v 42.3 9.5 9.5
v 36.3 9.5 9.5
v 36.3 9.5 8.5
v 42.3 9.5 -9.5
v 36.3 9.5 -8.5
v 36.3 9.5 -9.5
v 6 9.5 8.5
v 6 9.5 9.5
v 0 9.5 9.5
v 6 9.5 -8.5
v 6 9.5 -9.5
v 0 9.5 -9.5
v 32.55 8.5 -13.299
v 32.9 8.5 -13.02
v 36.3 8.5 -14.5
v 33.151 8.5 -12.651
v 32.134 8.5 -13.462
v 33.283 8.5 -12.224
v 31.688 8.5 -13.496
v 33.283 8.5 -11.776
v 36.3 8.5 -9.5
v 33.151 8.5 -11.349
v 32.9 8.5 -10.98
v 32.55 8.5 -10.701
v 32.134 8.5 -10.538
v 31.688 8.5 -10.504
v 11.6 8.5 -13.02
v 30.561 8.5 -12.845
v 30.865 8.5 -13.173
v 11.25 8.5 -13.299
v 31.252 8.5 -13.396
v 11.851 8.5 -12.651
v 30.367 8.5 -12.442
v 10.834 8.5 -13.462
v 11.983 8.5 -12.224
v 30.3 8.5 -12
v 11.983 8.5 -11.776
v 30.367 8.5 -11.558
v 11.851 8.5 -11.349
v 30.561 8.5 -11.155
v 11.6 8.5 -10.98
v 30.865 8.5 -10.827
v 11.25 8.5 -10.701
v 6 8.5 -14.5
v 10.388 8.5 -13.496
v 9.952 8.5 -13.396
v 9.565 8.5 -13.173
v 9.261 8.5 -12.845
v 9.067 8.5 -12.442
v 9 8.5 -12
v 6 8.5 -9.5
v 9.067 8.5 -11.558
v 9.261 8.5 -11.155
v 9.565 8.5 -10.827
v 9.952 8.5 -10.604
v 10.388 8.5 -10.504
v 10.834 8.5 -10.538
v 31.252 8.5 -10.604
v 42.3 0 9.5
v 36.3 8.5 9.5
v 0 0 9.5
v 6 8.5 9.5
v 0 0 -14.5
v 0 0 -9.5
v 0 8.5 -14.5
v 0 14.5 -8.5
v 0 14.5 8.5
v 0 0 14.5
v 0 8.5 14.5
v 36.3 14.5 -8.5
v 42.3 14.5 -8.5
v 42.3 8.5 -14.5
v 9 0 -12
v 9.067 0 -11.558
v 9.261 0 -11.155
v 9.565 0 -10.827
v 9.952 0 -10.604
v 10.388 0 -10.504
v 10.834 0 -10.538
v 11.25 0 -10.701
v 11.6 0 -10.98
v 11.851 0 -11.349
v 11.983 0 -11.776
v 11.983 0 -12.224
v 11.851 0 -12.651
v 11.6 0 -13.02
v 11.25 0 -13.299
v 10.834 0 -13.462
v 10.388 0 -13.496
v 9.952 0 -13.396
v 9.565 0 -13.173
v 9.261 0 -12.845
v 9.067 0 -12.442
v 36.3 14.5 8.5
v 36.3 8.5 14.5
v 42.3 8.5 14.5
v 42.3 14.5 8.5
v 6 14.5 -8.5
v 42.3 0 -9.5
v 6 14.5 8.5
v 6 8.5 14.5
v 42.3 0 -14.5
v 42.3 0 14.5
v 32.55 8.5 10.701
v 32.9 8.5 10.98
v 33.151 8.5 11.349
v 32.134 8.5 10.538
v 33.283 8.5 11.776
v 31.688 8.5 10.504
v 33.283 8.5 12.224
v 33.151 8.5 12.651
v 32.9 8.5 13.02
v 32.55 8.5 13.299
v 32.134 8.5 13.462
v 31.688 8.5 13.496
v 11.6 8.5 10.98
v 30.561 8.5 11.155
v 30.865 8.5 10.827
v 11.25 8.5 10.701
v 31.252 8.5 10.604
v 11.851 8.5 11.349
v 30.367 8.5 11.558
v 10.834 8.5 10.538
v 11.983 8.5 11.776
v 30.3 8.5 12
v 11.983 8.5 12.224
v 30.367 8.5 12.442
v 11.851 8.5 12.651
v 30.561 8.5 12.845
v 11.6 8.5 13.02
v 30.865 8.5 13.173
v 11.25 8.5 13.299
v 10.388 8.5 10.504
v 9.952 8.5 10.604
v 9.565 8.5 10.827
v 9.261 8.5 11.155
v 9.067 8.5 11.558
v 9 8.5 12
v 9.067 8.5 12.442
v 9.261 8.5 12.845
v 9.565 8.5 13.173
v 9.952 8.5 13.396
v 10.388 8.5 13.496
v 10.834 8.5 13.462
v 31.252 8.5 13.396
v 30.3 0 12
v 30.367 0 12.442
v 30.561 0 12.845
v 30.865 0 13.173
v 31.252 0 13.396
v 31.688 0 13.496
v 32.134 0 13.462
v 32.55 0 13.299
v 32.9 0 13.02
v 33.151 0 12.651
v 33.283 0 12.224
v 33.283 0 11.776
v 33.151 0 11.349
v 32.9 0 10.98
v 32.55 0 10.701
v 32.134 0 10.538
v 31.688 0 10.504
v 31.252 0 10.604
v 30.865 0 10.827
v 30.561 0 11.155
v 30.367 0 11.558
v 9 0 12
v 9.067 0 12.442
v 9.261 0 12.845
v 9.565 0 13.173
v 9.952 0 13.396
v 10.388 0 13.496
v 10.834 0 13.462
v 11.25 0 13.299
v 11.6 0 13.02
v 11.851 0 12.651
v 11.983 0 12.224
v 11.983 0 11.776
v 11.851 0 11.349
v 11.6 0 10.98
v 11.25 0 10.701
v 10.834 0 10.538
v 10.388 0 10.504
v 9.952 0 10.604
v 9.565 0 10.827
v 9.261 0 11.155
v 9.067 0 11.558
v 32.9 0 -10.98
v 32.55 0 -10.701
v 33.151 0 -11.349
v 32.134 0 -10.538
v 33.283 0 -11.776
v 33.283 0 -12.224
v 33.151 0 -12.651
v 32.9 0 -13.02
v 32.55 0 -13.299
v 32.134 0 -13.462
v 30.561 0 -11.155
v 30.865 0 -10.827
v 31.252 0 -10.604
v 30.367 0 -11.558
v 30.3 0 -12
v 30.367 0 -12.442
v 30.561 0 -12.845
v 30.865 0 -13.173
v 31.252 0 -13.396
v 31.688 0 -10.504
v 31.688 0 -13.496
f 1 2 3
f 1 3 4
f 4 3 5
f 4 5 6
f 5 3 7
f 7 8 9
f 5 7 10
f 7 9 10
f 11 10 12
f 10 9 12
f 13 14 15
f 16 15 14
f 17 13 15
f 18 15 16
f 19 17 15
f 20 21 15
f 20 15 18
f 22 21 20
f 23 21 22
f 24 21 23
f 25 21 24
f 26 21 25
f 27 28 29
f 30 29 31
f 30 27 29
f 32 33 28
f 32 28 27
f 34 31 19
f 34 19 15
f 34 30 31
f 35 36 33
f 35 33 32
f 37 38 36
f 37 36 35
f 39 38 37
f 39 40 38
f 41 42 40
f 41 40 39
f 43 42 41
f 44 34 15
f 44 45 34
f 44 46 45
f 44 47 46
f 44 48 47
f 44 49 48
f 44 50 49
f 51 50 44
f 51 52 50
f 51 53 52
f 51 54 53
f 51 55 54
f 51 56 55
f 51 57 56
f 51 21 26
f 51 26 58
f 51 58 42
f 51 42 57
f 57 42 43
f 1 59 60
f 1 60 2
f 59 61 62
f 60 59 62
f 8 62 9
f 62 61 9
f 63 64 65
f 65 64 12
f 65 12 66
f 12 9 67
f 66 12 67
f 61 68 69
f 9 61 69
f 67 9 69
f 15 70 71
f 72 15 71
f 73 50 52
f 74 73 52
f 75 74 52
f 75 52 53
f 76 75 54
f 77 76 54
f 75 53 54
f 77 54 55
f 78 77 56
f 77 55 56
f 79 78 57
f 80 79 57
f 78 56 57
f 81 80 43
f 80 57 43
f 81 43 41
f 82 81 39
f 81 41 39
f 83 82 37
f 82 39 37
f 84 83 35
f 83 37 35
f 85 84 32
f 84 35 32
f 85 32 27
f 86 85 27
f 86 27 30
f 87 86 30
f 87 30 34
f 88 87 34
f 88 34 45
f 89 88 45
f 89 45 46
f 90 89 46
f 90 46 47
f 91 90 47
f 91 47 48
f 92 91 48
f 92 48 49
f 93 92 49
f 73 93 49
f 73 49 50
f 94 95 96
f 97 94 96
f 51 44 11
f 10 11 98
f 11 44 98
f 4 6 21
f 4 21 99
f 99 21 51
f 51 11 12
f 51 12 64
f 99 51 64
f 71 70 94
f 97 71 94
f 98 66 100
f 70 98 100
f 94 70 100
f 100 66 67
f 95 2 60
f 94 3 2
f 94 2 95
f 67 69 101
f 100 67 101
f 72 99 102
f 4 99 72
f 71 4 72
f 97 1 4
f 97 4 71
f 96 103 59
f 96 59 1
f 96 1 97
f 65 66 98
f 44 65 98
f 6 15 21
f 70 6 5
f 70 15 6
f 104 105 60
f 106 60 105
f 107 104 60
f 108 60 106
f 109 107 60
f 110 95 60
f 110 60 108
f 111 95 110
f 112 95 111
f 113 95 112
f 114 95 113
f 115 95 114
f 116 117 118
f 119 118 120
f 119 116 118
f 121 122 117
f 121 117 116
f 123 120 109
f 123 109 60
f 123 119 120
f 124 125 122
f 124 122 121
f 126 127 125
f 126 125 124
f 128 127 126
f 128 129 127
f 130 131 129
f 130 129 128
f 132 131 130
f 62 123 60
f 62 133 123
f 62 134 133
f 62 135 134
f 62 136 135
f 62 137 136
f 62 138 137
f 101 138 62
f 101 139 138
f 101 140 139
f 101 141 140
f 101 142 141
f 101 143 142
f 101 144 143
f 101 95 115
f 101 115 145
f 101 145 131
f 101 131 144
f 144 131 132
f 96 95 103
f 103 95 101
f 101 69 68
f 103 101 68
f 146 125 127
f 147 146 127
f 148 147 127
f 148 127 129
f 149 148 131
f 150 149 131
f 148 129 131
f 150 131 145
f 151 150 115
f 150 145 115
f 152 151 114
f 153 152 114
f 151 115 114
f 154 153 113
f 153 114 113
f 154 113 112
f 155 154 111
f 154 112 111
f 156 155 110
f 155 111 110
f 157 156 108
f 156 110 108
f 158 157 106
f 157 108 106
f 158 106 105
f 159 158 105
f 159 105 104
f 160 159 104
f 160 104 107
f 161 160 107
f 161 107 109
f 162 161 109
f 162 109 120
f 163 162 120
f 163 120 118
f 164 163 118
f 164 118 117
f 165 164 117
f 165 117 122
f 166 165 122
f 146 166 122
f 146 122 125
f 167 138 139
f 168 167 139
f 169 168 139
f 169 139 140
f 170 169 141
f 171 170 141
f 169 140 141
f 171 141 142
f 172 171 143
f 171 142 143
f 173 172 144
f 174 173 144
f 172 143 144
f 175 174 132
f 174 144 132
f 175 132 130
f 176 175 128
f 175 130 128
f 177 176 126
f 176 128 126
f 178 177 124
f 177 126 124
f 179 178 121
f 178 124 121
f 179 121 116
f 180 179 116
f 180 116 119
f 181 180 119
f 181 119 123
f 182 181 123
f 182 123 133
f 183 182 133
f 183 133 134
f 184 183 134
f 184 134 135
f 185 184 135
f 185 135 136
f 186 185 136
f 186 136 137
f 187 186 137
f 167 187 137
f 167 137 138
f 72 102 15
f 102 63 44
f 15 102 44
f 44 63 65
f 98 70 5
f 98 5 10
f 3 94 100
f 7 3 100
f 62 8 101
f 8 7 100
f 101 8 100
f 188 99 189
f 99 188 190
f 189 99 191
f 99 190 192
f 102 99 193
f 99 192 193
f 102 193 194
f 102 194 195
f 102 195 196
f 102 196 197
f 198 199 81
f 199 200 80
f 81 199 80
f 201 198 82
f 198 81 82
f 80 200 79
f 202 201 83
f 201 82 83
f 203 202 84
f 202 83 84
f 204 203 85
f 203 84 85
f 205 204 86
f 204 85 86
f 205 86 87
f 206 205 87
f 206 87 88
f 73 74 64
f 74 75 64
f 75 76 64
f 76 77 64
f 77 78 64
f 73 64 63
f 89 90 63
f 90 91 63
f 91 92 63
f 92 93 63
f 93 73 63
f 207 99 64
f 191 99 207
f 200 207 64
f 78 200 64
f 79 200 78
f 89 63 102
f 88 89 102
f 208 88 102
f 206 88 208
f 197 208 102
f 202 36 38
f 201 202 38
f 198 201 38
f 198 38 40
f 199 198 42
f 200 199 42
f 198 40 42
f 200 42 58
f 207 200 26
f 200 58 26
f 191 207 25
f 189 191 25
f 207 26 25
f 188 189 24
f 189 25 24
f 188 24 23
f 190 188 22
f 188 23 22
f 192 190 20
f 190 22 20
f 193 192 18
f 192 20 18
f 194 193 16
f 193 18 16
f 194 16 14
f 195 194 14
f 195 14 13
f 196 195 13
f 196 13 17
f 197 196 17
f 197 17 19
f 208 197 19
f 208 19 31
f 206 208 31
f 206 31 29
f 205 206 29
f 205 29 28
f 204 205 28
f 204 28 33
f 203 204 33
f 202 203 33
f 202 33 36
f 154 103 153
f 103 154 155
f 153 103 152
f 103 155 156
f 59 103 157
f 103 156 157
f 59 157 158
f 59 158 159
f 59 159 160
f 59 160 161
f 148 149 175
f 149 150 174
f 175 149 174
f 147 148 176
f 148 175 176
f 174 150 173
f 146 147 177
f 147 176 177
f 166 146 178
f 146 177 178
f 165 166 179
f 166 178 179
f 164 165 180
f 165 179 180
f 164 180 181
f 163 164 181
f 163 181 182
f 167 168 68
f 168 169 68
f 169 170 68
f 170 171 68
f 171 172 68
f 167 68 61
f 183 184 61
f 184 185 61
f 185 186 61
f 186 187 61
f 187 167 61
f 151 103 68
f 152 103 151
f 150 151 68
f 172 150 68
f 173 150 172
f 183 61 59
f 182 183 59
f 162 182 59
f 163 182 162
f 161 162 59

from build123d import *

# Parameters (mm, degrees)
F1_DEPTH = 42.3
F2_W     = 30.3
F2_H     = 6
F3_DEPTH = 6
F4_SIZE  = 6
F5_R     = 1.5
F6_DEPTH = 8.501
F7_R     = 1.5
F8_DEPTH = 8.501


# Not quite as in the source:
# - a feature names something its author has since deleted; it is built from what else it names


with BuildPart() as f1:
    # F0 (on Right) → F1 (new body)
    with BuildSketch(Plane.YZ):
        Polygon((0, 9.5), (9.5, 9.5), (9.5, -9.5), (0, -9.5), (0, -14.5), (14.5, -14.5), (14.5, 14.5), (0, 14.5), align=None)
    extrude(amount=F1_DEPTH)

    # F2 (on face) → F3 (cut)
    with BuildSketch(Plane(origin=(0, 14.5, 0), x_dir=(-1, 0, 0), z_dir=(0, 1, 0))):
        with Locations((-21.15, 11.5)):
            Rectangle(F2_W, F2_H)
        with Locations((-21.15, -11.5)):
            Rectangle(F2_W, F2_H)
    extrude(amount=-F3_DEPTH, mode=Mode.SUBTRACT)

    # F4
    f4_edges = [f1.edges().sort_by_distance(p)[0] for p in [
        (3, 14.5, -14.5),
        (39.3, 14.5, -14.5),
        (39.3, 14.5, 14.5),
        (3, 14.5, 14.5),
    ]]
    chamfer(f4_edges, length=F4_SIZE)

    # F5 (on face) → F6 (cut, through all)
    with BuildSketch(Plane(origin=(0, 8.5, 0), x_dir=(-1, 0, 0), z_dir=(0, 1, 0))):
        with Locations((-31.8, 12)):
            Circle(F5_R)
        with Locations((-10.5, 12)):
            Circle(F5_R)
    extrude(amount=-F6_DEPTH, mode=Mode.SUBTRACT)

    # F7 (on face) → F8 (cut, through all)
    with BuildSketch(Plane(origin=(0, 8.5, 0), x_dir=(-1, 0, 0), z_dir=(0, 1, 0))):
        with Locations((-31.8, -12)):
            Circle(F7_R)
        with Locations((-10.5, -12)):
            Circle(F7_R)
    extrude(amount=-F8_DEPTH, mode=Mode.SUBTRACT)


solid = f1.part
